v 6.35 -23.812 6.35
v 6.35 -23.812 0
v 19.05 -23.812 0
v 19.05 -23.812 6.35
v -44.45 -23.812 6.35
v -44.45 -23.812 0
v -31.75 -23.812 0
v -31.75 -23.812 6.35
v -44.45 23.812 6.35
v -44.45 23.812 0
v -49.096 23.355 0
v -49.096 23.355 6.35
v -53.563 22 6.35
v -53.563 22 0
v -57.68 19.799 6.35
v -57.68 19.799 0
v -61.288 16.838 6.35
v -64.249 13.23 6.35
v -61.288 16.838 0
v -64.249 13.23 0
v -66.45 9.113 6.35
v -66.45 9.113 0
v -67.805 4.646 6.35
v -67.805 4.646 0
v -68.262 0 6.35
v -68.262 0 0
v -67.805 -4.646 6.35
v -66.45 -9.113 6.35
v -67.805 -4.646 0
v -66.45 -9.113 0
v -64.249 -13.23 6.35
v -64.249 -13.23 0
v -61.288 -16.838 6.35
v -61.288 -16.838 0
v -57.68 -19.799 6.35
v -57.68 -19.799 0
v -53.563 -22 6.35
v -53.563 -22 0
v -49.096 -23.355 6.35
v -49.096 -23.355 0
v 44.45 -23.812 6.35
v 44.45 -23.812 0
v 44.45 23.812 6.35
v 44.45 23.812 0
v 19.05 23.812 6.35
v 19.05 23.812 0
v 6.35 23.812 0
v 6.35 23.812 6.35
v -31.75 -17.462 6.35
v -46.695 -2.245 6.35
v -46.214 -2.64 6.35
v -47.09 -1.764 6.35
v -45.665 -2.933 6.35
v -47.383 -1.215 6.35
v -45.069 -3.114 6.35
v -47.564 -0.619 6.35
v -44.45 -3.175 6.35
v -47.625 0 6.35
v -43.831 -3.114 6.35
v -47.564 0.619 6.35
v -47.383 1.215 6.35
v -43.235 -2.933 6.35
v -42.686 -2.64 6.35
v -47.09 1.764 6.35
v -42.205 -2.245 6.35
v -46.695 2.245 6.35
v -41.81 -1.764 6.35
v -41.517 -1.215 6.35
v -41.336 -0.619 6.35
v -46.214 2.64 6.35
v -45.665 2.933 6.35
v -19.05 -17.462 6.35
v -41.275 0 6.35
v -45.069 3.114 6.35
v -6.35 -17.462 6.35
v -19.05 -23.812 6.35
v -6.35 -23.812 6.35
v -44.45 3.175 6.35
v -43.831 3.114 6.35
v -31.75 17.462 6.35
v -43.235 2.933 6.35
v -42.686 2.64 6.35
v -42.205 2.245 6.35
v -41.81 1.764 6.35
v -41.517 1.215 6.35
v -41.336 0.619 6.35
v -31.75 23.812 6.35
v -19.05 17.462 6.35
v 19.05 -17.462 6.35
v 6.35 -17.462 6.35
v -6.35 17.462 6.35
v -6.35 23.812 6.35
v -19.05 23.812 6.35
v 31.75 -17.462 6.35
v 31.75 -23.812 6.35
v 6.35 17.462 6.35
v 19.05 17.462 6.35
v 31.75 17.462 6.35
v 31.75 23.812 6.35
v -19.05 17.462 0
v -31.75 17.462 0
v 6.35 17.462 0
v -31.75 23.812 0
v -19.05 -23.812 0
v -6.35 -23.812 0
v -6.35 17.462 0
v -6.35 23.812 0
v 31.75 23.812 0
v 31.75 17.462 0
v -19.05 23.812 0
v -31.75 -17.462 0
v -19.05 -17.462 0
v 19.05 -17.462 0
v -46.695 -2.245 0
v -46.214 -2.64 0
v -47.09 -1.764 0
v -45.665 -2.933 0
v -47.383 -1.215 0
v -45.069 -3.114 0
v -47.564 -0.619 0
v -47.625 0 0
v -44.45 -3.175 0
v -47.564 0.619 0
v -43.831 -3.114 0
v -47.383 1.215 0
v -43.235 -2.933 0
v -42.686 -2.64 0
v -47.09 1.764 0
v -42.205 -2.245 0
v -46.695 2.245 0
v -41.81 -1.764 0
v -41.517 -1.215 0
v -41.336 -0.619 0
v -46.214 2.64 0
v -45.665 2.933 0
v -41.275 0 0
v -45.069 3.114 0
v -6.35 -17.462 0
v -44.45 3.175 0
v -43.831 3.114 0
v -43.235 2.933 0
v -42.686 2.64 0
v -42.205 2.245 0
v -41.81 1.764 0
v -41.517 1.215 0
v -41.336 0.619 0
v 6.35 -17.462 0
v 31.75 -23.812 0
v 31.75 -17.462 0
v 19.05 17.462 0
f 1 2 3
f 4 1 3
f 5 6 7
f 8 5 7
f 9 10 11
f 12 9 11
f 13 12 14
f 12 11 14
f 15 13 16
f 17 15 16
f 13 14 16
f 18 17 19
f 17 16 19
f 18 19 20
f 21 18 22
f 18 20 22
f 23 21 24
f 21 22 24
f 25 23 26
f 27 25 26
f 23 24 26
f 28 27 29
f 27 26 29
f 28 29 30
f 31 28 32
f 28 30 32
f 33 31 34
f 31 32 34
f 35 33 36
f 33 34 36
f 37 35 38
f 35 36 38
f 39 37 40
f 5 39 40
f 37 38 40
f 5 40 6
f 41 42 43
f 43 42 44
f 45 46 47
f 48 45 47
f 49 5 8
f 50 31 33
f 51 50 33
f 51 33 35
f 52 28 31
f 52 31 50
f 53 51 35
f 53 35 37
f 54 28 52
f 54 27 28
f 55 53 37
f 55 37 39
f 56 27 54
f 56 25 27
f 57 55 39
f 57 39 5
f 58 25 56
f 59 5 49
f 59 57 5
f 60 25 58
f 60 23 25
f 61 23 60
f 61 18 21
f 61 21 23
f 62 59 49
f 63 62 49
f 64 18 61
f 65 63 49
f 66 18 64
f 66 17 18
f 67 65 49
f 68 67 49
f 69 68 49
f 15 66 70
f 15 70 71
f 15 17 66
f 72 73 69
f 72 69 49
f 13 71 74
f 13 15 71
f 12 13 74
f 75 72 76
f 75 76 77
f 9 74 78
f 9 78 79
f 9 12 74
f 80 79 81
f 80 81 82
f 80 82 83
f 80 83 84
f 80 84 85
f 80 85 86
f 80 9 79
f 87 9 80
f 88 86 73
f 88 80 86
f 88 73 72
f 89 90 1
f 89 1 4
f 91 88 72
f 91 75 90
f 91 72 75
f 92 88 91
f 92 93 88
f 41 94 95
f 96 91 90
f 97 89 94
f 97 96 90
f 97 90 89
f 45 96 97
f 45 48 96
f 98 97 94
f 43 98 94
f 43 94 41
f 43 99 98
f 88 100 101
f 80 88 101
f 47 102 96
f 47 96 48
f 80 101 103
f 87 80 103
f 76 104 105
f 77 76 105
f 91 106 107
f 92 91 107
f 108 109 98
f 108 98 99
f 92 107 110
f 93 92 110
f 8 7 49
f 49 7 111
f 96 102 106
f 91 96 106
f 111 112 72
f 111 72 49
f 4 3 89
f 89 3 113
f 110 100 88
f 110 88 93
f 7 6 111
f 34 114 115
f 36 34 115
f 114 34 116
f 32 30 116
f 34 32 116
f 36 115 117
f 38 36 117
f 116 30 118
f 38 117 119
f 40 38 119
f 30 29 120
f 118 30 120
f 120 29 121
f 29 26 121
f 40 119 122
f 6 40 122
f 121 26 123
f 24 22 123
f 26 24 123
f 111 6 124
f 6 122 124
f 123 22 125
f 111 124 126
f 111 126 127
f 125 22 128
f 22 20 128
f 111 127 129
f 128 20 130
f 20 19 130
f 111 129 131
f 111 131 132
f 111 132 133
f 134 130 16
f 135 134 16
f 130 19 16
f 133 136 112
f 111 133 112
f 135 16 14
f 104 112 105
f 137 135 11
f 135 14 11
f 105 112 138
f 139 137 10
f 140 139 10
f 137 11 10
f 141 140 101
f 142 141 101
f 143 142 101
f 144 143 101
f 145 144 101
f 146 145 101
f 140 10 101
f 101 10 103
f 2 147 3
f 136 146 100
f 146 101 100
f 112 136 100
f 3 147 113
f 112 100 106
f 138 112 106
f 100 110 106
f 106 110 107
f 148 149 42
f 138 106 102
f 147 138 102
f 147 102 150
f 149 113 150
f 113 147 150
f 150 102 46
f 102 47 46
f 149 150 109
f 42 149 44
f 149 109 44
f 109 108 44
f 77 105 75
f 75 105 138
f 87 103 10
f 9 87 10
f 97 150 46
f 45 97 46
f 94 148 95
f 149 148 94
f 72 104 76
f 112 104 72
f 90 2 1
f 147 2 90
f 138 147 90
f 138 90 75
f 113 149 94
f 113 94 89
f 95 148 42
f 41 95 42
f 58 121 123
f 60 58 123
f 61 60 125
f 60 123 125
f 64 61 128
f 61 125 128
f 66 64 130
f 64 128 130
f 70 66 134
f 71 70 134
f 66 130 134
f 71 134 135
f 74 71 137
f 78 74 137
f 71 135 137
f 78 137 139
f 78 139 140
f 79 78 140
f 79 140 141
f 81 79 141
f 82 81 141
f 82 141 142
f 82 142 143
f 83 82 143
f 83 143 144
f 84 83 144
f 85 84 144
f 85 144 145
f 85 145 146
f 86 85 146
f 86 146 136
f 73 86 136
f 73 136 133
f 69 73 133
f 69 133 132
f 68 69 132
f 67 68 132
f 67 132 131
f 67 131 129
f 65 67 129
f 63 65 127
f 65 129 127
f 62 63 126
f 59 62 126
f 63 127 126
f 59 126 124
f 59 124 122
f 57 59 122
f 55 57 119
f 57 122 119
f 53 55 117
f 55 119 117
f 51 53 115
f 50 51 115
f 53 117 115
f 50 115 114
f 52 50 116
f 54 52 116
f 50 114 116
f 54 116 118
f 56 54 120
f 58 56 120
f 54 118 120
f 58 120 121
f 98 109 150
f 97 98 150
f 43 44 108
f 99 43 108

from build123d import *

# Parameters (mm, degrees)
MASS_DEPTH         = 6.35
SKETCH4_R          = 3.175
CUT_EXTRUDE1_DEPTH = 73.574972012
SKETCH3_W          = 12.7
SKETCH3_H          = 12.7
CUT_EXTRUDE2_DEPTH = 73.574972012
LPATTERN1_COUNT    = 3
LPATTERN1_PITCH    = 25.4


with BuildPart() as part:
    # Sketch1 → Mass (new body)
    with BuildSketch(Plane.XY):
        with BuildLine():
            Line((-44.45, -23.8125), (44.45, -23.8125))
            Line((44.45, -23.8125), (44.45, 23.8125))
            Line((44.45, 23.8125), (-44.45, 23.8125))
            ThreePointArc((-44.45, 23.8125), (-68.2625, 0), (-44.45, -23.8125))
        make_face()
    extrude(amount=MASS_DEPTH)

    # Sketch4 → Cut-Extrude1 (cut, through all)
    with BuildSketch(Plane(origin=(0, 0, 0), x_dir=(-1, 0, 0), z_dir=(0, 0, -1))):
        with Locations((44.45, 0)):
            Circle(SKETCH4_R)
    extrude(amount=-CUT_EXTRUDE1_DEPTH, mode=Mode.SUBTRACT)

    # Sketch3 → Cut-Extrude2 (cut, through all)
    with BuildSketch(Plane(origin=(0, 0, 0), x_dir=(-1, 0, 0), z_dir=(0, 0, -1))):
        with Locations((-25.4, 23.8125)):
            Rectangle(SKETCH3_W, SKETCH3_H)
        with Locations((-25.4, -23.8125)):
            Rectangle(SKETCH3_W, SKETCH3_H)
    cut_extrude2 = extrude(amount=-CUT_EXTRUDE2_DEPTH, mode=Mode.SUBTRACT)

    # LPattern1: Cut-Extrude2 ×3
    with Locations(*[(-i * LPATTERN1_PITCH, 0, 0) for i in range(1, LPATTERN1_COUNT)]):
        add(cut_extrude2, mode=Mode.SUBTRACT)


solid = part.part
